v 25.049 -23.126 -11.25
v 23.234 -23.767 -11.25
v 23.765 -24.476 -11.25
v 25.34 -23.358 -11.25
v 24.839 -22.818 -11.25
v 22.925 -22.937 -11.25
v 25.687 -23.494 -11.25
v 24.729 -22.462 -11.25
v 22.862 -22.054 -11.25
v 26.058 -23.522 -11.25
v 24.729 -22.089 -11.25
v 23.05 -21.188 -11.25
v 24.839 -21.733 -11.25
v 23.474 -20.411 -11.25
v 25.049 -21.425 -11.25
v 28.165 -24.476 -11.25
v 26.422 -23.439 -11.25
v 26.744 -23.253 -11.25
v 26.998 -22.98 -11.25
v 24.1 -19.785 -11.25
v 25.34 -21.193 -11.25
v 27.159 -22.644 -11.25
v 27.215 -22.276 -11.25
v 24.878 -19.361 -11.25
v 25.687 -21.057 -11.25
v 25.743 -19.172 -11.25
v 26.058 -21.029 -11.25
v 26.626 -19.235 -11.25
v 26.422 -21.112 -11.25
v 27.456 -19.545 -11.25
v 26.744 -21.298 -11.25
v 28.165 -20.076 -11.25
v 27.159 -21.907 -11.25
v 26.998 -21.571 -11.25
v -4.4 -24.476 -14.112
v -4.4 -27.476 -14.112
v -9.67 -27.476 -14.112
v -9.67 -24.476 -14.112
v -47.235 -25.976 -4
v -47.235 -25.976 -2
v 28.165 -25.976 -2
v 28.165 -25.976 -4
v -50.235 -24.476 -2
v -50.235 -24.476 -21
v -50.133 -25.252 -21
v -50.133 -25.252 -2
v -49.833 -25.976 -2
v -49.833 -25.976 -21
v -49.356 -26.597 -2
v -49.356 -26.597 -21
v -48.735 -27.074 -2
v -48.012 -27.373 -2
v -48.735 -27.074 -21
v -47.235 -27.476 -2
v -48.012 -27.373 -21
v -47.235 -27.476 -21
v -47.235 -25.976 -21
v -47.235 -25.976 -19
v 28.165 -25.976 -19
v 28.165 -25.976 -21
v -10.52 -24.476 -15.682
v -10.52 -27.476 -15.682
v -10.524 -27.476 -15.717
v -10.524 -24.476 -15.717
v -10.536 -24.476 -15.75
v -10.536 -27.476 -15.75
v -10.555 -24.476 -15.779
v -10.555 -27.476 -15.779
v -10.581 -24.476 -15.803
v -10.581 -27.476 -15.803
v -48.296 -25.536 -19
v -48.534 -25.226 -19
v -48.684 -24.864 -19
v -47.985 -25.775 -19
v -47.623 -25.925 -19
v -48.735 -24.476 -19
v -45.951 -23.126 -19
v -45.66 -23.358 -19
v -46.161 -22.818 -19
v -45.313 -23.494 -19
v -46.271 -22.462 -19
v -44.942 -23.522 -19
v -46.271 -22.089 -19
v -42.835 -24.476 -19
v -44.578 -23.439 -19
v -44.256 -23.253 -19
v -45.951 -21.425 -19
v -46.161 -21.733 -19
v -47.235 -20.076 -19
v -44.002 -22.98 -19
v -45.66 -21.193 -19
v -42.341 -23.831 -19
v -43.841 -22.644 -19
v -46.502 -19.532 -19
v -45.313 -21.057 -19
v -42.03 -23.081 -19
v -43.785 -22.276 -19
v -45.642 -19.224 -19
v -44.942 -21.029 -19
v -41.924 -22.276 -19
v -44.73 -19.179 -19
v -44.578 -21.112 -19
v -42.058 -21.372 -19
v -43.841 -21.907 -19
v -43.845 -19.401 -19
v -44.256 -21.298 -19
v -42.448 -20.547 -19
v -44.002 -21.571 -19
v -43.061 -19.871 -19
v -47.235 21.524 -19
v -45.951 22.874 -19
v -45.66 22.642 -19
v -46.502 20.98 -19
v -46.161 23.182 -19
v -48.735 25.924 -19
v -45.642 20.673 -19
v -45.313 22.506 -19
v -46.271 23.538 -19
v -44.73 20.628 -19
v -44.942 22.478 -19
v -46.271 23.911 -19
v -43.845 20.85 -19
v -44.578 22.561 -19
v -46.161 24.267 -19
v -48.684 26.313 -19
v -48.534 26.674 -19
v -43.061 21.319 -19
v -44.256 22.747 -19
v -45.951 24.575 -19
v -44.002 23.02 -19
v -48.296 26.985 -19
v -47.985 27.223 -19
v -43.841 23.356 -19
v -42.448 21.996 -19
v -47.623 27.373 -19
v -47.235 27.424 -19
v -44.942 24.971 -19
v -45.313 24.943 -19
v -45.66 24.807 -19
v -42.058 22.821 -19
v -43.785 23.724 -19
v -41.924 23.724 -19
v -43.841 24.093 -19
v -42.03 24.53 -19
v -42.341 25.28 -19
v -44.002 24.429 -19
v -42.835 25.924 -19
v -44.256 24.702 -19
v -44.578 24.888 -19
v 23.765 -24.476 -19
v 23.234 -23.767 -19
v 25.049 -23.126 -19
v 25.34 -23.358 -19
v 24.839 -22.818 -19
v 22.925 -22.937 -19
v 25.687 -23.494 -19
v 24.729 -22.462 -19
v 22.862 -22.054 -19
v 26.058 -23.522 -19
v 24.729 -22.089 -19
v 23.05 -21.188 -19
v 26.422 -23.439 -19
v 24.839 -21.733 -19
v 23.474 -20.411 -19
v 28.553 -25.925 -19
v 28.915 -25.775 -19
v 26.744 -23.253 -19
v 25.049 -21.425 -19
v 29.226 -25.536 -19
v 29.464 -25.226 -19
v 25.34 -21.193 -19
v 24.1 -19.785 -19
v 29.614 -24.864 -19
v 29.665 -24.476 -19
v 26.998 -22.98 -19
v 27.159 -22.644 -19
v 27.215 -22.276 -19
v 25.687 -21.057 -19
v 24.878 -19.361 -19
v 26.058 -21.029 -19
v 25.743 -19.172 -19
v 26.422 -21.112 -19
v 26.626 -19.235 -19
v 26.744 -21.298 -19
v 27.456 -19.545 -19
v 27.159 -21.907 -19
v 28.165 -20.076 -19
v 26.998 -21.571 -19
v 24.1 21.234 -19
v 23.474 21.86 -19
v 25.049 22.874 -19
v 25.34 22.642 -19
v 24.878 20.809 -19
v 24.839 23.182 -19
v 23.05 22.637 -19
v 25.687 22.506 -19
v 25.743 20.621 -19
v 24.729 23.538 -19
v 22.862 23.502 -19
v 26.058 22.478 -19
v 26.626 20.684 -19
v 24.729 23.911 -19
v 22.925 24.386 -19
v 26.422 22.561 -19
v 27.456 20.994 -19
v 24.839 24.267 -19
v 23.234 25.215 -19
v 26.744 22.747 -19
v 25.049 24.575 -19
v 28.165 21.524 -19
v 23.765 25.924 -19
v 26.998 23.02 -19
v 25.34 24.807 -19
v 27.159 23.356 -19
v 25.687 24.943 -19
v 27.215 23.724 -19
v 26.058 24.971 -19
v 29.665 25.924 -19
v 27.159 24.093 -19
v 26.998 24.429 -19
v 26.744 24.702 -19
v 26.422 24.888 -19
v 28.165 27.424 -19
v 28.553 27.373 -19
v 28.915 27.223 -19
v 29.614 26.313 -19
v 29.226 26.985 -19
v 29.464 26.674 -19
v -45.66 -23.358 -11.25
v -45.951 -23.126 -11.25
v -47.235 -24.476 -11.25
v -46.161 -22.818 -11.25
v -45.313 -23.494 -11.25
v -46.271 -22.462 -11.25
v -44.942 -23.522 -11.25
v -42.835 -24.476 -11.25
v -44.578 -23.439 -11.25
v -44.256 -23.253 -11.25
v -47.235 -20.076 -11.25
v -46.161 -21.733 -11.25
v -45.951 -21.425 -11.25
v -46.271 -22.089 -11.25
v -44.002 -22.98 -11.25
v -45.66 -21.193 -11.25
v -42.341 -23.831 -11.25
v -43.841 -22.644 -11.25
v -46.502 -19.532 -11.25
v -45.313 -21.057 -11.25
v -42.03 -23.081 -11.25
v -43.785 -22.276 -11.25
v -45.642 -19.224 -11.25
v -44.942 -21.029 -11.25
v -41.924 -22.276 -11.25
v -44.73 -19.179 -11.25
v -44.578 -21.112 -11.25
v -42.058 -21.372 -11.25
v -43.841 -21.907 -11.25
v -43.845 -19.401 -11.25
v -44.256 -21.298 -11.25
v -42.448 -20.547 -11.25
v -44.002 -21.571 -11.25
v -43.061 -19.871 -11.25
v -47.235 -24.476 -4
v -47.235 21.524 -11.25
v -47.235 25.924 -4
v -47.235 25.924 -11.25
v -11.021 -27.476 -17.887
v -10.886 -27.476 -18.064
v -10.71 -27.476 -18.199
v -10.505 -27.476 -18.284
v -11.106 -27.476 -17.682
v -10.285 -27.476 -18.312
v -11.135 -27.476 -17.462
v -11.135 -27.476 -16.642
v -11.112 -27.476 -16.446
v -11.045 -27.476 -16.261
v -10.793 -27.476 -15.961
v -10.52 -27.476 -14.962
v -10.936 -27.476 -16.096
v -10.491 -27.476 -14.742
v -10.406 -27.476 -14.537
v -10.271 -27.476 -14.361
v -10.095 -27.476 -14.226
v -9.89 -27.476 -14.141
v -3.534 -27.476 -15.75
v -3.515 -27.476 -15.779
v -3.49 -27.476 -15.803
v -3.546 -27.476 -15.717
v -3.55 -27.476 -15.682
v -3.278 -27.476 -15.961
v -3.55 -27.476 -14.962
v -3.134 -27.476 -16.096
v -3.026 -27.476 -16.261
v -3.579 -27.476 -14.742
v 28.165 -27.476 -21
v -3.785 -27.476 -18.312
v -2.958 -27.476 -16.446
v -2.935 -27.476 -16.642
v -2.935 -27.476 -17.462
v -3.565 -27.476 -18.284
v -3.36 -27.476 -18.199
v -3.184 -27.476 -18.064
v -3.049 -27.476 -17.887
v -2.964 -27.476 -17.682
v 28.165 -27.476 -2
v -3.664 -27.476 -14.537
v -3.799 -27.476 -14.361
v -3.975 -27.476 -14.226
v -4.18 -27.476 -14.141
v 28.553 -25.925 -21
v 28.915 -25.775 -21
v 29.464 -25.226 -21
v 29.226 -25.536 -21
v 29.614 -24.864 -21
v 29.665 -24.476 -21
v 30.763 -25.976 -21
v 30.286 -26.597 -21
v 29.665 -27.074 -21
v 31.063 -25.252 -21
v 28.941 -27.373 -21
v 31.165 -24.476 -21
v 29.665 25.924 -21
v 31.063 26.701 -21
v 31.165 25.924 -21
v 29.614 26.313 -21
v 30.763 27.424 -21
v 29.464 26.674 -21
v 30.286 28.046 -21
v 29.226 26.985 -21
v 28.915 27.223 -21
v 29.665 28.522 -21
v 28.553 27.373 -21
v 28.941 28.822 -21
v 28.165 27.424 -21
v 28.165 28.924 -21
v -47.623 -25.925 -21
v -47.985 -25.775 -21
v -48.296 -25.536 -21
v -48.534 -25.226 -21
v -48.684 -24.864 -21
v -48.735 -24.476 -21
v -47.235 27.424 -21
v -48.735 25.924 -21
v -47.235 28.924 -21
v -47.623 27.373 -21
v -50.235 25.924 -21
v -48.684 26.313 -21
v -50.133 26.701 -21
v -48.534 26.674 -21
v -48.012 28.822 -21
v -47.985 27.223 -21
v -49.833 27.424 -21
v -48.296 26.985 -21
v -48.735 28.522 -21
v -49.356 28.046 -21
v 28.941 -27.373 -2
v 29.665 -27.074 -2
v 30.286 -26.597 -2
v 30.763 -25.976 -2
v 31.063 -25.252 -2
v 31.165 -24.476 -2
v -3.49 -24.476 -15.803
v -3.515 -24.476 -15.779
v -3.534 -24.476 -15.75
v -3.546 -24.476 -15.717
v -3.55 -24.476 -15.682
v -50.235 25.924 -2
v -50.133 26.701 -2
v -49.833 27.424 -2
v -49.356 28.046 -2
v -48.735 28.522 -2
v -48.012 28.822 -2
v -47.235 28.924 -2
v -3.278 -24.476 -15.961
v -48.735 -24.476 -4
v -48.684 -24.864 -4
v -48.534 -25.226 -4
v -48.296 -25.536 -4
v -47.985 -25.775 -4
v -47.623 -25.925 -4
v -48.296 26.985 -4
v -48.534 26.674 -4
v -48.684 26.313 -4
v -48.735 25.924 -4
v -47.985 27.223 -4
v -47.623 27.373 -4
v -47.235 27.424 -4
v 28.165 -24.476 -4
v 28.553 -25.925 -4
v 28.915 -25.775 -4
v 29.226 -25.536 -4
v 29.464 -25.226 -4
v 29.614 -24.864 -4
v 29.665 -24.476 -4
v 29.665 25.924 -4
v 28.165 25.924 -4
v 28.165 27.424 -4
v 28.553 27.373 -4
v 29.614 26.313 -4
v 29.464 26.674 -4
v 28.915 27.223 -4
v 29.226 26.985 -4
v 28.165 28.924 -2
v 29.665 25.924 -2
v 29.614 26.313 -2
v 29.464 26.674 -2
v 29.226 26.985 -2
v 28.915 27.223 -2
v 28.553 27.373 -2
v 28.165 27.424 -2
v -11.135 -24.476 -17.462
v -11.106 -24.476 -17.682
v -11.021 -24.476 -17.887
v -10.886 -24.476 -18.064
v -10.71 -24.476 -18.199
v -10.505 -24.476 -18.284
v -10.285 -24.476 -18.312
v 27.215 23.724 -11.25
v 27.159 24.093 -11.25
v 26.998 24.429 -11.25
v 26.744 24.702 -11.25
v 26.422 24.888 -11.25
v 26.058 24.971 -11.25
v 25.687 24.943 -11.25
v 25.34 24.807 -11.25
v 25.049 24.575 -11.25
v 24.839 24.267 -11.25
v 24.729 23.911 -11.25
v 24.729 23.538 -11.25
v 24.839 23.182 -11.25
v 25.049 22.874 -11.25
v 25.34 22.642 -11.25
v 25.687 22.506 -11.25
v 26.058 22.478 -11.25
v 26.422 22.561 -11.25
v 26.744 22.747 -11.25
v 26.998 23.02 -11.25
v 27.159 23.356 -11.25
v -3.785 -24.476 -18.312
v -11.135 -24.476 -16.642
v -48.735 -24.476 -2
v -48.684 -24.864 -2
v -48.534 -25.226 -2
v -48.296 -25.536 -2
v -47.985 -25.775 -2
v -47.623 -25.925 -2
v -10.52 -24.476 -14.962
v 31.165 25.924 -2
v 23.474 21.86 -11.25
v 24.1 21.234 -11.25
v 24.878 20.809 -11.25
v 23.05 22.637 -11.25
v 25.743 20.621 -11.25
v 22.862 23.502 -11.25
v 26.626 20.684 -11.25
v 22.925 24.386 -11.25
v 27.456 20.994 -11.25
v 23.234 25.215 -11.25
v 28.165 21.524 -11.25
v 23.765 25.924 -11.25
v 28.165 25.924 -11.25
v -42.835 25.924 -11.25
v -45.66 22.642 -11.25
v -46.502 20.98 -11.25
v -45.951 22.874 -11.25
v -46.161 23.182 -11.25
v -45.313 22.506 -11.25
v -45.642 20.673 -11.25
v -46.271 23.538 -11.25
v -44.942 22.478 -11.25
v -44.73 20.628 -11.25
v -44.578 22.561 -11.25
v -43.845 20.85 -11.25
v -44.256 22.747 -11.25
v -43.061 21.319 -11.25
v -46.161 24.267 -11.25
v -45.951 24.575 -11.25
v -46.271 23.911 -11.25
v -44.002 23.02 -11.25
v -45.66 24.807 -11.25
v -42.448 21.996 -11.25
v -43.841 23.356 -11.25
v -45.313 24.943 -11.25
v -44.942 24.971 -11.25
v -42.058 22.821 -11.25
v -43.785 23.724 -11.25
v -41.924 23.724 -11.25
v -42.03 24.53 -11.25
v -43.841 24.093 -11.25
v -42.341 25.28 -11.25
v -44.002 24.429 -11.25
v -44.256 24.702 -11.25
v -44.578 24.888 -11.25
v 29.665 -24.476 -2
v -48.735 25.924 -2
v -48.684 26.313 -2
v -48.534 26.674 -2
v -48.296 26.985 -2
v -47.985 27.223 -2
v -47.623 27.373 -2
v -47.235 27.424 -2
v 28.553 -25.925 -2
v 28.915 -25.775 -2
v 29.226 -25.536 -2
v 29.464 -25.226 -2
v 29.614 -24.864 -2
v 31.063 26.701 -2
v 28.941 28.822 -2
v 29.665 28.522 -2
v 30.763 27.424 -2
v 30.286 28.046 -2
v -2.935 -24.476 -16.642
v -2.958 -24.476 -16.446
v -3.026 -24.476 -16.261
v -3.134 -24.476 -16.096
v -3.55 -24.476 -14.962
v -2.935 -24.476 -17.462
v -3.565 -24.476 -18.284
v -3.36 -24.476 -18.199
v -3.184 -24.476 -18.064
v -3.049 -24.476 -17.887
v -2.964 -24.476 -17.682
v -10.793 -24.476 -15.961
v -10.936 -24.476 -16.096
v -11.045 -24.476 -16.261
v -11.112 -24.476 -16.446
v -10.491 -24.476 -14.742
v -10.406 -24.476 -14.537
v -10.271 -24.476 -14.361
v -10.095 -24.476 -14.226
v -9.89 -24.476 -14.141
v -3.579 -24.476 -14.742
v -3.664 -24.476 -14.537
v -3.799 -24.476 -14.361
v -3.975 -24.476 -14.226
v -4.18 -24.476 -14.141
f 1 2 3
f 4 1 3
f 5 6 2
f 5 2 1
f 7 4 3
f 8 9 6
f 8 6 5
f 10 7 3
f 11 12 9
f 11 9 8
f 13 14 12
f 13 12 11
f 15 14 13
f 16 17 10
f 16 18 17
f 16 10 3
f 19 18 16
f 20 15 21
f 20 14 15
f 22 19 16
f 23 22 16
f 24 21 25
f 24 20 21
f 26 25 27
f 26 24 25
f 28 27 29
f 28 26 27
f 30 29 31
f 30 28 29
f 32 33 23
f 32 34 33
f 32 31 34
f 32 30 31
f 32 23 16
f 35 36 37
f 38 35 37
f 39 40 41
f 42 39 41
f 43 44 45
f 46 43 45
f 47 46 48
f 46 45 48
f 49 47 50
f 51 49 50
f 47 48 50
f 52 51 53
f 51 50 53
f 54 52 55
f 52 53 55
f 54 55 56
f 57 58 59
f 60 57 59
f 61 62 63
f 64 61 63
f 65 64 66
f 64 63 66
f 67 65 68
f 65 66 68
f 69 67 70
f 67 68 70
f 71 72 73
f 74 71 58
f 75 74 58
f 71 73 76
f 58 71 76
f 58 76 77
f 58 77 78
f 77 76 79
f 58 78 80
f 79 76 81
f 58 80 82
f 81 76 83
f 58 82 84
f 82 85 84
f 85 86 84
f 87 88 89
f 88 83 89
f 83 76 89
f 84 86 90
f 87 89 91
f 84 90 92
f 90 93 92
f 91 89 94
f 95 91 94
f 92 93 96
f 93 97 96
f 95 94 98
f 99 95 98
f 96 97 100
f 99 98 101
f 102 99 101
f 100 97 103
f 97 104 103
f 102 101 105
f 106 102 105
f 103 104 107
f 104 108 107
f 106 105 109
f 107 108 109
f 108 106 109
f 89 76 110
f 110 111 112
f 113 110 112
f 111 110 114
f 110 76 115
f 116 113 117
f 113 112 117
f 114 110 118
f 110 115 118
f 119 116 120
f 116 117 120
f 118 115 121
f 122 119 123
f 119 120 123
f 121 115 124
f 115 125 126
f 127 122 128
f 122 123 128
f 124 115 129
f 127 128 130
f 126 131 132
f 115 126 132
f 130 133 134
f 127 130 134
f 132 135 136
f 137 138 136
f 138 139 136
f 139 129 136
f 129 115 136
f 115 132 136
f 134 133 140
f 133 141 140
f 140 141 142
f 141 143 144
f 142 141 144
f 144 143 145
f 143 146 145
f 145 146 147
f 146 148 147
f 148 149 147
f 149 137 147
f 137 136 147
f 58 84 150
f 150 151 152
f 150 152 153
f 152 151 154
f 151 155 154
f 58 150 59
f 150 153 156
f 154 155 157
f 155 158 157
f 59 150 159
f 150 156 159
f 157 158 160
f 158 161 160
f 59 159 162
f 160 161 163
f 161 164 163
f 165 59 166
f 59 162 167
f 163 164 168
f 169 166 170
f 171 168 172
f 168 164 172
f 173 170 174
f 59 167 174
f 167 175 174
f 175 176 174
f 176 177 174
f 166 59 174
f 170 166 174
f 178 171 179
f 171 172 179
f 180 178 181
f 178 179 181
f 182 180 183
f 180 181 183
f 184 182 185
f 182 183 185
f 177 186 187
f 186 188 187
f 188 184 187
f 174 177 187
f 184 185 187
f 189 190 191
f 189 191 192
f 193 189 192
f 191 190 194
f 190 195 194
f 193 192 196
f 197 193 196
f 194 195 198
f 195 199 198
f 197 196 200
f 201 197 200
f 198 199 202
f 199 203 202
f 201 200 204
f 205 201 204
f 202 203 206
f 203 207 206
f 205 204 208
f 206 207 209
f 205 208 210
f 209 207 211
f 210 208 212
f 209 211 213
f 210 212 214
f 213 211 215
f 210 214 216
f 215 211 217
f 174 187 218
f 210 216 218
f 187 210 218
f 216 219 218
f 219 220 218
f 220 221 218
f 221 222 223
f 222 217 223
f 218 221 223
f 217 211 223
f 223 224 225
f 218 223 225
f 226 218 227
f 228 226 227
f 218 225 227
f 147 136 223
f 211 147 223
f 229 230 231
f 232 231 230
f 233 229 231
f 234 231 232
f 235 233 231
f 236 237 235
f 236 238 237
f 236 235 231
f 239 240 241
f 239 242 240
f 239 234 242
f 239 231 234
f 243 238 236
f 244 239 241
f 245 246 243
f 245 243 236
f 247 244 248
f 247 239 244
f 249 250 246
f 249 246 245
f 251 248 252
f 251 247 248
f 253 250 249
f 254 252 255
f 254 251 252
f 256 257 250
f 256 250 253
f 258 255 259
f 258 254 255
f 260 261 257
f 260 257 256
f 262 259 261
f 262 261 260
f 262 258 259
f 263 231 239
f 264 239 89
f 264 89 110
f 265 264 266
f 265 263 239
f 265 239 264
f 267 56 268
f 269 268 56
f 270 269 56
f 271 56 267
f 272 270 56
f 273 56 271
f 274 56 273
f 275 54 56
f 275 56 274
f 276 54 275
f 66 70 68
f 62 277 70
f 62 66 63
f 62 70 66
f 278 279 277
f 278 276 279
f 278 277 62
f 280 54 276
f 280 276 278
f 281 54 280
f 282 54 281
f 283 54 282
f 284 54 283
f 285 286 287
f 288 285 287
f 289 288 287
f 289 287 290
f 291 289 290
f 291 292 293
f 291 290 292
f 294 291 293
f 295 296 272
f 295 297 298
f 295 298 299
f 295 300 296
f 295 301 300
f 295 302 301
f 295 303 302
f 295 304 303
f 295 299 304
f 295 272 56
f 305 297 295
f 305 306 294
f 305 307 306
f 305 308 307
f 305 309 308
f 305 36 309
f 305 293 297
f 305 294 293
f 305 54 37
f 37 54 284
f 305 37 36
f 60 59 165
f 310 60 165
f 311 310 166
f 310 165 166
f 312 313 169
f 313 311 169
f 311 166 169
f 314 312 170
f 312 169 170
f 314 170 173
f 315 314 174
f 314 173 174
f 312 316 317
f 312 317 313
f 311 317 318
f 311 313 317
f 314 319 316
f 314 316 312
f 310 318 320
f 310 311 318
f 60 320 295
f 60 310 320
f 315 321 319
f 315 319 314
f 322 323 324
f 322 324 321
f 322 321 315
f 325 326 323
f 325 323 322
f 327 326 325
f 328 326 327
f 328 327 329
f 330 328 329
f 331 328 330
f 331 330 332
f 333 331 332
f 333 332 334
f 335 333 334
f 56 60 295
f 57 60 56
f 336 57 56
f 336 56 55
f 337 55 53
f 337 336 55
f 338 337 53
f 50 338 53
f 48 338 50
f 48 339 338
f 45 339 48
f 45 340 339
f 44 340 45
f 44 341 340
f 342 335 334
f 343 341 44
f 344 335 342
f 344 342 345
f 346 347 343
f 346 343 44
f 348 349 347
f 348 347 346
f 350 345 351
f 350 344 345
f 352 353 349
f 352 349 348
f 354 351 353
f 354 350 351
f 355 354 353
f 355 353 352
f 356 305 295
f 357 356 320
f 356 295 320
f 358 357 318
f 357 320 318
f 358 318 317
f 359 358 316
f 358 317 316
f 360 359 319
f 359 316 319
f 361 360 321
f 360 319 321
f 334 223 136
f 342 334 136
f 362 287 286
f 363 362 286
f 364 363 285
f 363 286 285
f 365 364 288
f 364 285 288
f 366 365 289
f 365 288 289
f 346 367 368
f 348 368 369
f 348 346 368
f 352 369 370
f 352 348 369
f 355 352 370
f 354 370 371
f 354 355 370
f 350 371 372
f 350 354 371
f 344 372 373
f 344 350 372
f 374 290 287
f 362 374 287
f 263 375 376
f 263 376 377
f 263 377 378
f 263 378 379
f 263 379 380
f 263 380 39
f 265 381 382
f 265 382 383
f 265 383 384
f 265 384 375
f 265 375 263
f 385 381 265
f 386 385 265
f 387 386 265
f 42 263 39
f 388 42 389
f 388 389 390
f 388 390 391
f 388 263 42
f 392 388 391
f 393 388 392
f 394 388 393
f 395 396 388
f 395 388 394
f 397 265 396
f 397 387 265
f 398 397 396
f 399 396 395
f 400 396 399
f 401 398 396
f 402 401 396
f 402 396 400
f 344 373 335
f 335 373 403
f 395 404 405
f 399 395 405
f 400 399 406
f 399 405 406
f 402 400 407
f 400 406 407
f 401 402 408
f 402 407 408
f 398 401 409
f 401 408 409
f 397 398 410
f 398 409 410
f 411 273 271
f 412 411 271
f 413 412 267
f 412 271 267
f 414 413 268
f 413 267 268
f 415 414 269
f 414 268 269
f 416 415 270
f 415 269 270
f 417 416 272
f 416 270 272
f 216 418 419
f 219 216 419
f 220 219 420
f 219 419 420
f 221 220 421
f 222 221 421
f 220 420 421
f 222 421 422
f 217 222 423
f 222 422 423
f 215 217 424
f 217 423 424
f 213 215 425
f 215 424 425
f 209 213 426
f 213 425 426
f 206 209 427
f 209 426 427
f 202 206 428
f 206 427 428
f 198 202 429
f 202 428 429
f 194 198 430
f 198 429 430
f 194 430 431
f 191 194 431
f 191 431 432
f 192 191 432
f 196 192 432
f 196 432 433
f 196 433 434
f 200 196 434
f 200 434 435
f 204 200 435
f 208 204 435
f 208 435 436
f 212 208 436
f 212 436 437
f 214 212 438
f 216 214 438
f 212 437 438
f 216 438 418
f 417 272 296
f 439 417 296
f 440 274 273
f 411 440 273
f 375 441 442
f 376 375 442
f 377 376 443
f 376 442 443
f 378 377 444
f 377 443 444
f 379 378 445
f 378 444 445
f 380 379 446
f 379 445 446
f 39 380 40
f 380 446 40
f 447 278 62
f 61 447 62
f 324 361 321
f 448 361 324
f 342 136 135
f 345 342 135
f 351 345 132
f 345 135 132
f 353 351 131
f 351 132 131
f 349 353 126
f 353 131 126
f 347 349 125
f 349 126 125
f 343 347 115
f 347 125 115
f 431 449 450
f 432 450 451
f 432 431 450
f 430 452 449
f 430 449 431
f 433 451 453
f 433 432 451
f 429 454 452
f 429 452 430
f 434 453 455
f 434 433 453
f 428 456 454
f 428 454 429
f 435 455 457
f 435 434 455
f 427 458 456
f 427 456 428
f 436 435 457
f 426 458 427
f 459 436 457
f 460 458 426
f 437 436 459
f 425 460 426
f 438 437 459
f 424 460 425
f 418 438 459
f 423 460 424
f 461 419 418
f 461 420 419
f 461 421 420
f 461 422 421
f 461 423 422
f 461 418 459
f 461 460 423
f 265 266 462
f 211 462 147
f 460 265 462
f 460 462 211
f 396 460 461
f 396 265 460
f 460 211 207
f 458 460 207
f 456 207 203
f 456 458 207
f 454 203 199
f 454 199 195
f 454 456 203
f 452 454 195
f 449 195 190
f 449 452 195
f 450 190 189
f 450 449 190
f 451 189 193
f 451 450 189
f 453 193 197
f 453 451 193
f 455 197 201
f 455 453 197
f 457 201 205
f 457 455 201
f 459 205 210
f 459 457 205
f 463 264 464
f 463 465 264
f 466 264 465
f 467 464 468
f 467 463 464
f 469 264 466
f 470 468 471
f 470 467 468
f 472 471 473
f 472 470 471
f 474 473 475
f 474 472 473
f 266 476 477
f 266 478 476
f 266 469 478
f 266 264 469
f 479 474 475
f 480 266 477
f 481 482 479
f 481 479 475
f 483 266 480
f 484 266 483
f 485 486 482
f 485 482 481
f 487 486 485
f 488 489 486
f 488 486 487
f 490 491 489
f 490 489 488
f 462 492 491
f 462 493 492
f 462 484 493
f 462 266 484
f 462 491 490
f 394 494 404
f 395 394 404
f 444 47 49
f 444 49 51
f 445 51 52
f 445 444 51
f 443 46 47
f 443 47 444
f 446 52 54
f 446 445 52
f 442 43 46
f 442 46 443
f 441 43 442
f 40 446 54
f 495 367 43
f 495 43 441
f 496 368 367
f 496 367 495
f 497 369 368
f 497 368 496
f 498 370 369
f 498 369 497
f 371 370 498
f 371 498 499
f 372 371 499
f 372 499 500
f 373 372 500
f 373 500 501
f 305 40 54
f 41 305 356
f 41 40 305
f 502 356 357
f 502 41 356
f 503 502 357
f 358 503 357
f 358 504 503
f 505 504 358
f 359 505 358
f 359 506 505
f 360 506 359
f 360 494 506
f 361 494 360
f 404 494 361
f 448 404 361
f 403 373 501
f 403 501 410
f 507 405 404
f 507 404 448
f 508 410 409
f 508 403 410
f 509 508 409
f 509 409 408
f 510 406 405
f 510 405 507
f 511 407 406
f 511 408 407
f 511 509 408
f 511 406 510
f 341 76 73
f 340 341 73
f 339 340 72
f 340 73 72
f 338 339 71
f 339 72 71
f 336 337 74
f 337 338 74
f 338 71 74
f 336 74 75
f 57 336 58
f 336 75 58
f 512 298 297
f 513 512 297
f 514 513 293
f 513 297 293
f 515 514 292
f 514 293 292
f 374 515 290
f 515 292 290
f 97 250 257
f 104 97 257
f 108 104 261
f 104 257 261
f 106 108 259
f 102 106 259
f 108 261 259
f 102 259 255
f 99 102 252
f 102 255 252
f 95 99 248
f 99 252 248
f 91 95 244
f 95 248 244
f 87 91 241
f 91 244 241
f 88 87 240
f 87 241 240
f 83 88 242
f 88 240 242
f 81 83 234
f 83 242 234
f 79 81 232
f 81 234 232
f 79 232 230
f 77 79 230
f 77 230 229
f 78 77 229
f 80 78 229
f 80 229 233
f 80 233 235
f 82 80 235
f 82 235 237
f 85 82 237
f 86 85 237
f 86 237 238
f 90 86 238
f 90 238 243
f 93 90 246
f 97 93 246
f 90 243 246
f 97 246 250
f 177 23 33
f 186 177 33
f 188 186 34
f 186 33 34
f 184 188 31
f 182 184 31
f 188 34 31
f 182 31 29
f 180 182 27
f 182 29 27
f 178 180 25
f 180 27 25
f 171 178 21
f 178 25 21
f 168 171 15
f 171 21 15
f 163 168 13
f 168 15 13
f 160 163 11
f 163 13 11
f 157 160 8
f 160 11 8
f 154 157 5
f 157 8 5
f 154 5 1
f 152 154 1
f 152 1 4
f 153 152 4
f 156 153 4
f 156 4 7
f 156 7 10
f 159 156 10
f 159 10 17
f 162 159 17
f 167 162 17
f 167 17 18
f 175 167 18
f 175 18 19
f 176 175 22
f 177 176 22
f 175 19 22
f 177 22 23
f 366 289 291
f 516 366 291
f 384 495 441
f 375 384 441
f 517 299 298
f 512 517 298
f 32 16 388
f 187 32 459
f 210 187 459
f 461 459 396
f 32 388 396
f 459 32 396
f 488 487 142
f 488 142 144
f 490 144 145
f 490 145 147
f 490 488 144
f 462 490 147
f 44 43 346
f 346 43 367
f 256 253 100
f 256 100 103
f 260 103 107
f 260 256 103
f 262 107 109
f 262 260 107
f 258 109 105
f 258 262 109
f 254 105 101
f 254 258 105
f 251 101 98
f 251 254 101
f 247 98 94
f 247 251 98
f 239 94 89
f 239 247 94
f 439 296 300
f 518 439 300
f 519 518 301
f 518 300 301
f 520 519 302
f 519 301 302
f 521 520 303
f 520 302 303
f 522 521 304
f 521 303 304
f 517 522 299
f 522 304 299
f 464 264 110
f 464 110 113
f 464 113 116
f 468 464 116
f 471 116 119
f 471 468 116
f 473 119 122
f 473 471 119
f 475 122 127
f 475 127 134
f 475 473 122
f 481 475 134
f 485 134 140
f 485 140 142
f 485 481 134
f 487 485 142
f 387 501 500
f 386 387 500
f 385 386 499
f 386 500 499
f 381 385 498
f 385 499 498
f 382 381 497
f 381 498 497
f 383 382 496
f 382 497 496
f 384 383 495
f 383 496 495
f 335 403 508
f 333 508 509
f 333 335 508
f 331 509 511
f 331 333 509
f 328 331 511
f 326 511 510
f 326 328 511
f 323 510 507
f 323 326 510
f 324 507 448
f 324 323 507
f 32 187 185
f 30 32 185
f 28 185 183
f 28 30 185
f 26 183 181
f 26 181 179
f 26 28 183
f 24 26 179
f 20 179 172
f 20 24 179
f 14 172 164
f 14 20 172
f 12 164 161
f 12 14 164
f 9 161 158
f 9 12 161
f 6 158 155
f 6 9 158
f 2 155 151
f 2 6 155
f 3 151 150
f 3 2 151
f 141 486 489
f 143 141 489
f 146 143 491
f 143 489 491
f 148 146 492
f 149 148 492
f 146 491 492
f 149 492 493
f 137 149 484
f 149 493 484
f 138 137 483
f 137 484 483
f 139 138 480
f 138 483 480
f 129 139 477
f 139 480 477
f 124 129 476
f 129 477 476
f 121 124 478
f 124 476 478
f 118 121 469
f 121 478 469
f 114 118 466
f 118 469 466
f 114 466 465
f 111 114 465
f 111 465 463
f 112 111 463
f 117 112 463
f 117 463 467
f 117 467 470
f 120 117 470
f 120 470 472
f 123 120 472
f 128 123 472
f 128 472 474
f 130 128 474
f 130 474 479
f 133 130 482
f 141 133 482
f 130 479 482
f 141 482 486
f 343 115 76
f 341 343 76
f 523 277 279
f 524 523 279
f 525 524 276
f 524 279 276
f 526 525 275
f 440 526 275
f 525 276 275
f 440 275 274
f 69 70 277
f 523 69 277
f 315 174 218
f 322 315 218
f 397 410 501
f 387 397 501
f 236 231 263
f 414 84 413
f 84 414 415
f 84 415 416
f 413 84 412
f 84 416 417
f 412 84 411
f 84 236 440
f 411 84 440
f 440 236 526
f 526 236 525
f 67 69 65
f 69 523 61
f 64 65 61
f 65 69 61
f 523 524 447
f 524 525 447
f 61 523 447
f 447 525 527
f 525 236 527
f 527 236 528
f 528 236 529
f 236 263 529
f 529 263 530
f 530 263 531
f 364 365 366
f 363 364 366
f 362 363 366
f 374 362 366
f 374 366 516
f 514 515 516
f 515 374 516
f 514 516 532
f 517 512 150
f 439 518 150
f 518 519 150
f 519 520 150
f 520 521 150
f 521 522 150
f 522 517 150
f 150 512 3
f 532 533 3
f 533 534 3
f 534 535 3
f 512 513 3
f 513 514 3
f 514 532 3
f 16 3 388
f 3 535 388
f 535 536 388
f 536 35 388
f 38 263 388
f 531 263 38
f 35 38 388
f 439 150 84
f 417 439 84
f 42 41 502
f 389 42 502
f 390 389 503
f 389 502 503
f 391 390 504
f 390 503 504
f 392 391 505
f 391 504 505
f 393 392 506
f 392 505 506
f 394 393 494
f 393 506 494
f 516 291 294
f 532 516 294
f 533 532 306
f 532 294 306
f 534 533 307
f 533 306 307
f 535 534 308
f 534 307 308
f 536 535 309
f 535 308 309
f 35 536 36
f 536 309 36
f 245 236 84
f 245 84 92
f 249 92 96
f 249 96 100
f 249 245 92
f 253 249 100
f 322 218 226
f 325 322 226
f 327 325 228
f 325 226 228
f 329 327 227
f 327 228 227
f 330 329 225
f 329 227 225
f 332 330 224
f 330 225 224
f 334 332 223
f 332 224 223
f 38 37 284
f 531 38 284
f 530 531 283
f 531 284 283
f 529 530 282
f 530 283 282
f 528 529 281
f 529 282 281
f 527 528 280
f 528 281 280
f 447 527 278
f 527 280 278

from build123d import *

# Parameters (mm, degrees)
BOSS_EXTRUDE1_START = -2
SKETCH1_W           = 81.4
SKETCH1_H           = 56.4
SKETCH1_W_2         = 75.4
SKETCH1_H_2         = 50.4
BOSS_EXTRUDE1_DEPTH = 27
FILLET1_R           = 3
SKETCH2_R           = 1.3
CUT_EXTRUDE1_DEPTH  = 2
CUT_EXTRUDE2_START  = -17
SKETCH2_3_R         = 1.3
CUT_EXTRUDE2_DEPTH  = 10
BOSS_EXTRUDE2_START = -7.25
SKETCH3_R           = 1.25
BOSS_EXTRUDE2_DEPTH = 7.75
CUT_EXTRUDE3_DEPTH  = 28.2
CUT_EXTRUDE4_START  = -8
CUT_EXTRUDE4_DEPTH  = 8


with BuildPart() as part:
    # Sketch1 → Boss-Extrude1 (new body)
    with BuildSketch(Plane.XY.offset(BOSS_EXTRUDE1_START)):
        with Locations((-9.535141298, 0.724362859)):
            Rectangle(SKETCH1_W, SKETCH1_H)
        with Locations((-9.535141298, 0.724362859)):
            Rectangle(SKETCH1_W_2, SKETCH1_H_2, mode=Mode.SUBTRACT)
    extrude(amount=-BOSS_EXTRUDE1_DEPTH)

    # Fillet1
    fillet1_edges = [part.edges().sort_by_distance(p)[0] for p in [
        (-50.235141298, -27.475637141, -15.5),
        (-50.235141298, 28.924362859, -15.5),
        (31.164858702, 28.924362859, -15.5),
        (31.164858702, -27.475637141, -15.5),
    ]]
    fillet(fillet1_edges, radius=FILLET1_R)

    # Sketch2 → Cut-Extrude1 (cut)
    with BuildSketch(Plane.XY.offset(-2)):
        with Locations((25.964858702, -22.275637141)):
            Circle(SKETCH2_R)
        with BuildLine():
            Line((28.164858702, 27.424362859), (-47.235141298, 27.424362859))
            ThreePointArc((-47.235141298, 27.424362859), (-48.29580147, 26.985023031), (-48.735141298, 25.924362859))
            Line((-48.735141298, 25.924362859), (-48.735141298, -24.475637141))
            ThreePointArc((-48.735141298, -24.475637141), (-48.29580147, -25.536297313), (-47.235141298, -25.975637141))
            Line((-47.235141298, -25.975637141), (28.164858702, -25.975637141))
            ThreePointArc((28.164858702, -25.975637141), (29.225518873, -25.536297313), (29.664858702, -24.475637141))
            Line((29.664858702, -24.475637141), (29.664858702, 25.924362859))
            ThreePointArc((29.664858702, 25.924362859), (29.225518873, 26.985023031), (28.164858702, 27.424362859))
        make_face()
    extrude(amount=-CUT_EXTRUDE1_DEPTH, mode=Mode.SUBTRACT)

    # Sketch2<3> → Cut-Extrude2 (cut)
    with BuildSketch(Plane.XY.offset(-2).offset(CUT_EXTRUDE2_START)):
        with BuildLine():
            Line((28.164858702, 27.424362859), (-47.235141298, 27.424362859))
            ThreePointArc((-47.235141298, 27.424362859), (-48.29580147, 26.985023031), (-48.735141298, 25.924362859))
            Line((-48.735141298, 25.924362859), (-48.735141298, -24.475637141))
            ThreePointArc((-48.735141298, -24.475637141), (-48.29580147, -25.536297313), (-47.235141298, -25.975637141))
            Line((-47.235141298, -25.975637141), (28.164858702, -25.975637141))
            ThreePointArc((28.164858702, -25.975637141), (29.225518873, -25.536297313), (29.664858702, -24.475637141))
            Line((29.664858702, -24.475637141), (29.664858702, 25.924362859))
            ThreePointArc((29.664858702, 25.924362859), (29.225518873, 26.985023031), (28.164858702, 27.424362859))
        make_face()
        with Locations((25.964858702, 23.724362859)):
            Circle(SKETCH2_3_R, mode=Mode.SUBTRACT)
        with Locations((-45.035141298, 23.724362859)):
            Circle(SKETCH2_3_R, mode=Mode.SUBTRACT)
        with Locations((-45.035141298, -22.275637141)):
            Circle(SKETCH2_3_R, mode=Mode.SUBTRACT)
        with Locations((25.964858702, -22.275637141)):
            Circle(SKETCH2_3_R, mode=Mode.SUBTRACT)
    extrude(amount=-CUT_EXTRUDE2_DEPTH, mode=Mode.SUBTRACT)

    # Sketch3 → Boss-Extrude2 (add)
    # profile 1 of 4: a face of its own
    with BuildSketch(Plane.XY.offset(-4).offset(BOSS_EXTRUDE2_START)):
        with BuildLine():
            Line((-47.235141298, -24.475637141), (-42.835141298, -24.475637141))
            ThreePointArc((-42.835141298, -24.475637141), (-42.160702776, -23.466268561), (-41.923871461, -22.275637141))
            ThreePointArc((-41.923871461, -22.275637141), (-43.844509878, -19.401198618), (-47.235141298, -20.075637141))
            Line((-47.235141298, -20.075637141), (-47.235141298, -24.475637141))
        make_face()
        with Locations((-45.035141298, -22.275637141)):
            Circle(SKETCH3_R, mode=Mode.SUBTRACT)
    # profile 2 of 4: a face of its own
    with BuildSketch(Plane.XY.offset(-4).offset(BOSS_EXTRUDE2_START)):
        with BuildLine():
            ThreePointArc((-41.923871461, 23.724362859), (-42.160702776, 24.914994279), (-42.835141298, 25.924362859))
            Line((-42.835141298, 25.924362859), (-47.235141298, 25.924362859))
            Line((-47.235141298, 25.924362859), (-47.235141298, 21.524362859))
            ThreePointArc((-47.235141298, 21.524362859), (-43.844509878, 20.849924336), (-41.923871461, 23.724362859))
        make_face()
        with Locations((-45.035141298, 23.724362859)):
            Circle(SKETCH3_R, mode=Mode.SUBTRACT)
    # profile 3 of 4: a face of its own
    with BuildSketch(Plane.XY.offset(-4).offset(BOSS_EXTRUDE2_START)):
        with BuildLine():
            ThreePointArc((23.764858702, 25.924362859), (23.764858702, 21.524362859), (28.164858702, 21.524362859))
            Line((28.164858702, 21.524362859), (28.164858702, 25.924362859))
            Line((28.164858702, 25.924362859), (23.764858702, 25.924362859))
        make_face()
        with Locations((25.964858702, 23.724362859)):
            Circle(SKETCH3_R, mode=Mode.SUBTRACT)
    # profile 4 of 4: a face of its own
    with BuildSketch(Plane.XY.offset(-4).offset(BOSS_EXTRUDE2_START)):
        with BuildLine():
            Line((23.764858702, -24.475637141), (28.164858702, -24.475637141))
            Line((28.164858702, -24.475637141), (28.164858702, -20.075637141))
            ThreePointArc((28.164858702, -20.075637141), (23.764858702, -20.075637141), (23.764858702, -24.475637141))
        make_face()
        with Locations((25.964858702, -22.275637141)):
            Circle(SKETCH3_R, mode=Mode.SUBTRACT)
    extrude(amount=-BOSS_EXTRUDE2_DEPTH)

    # Sketch5 → Cut-Extrude3 (cut)
    with BuildSketch(Plane.XZ.offset(27.475637141)):
        with BuildLine():
            Line((-10.285143265, -18.312481798), (-3.785143265, -18.312481798))
            ThreePointArc((-3.785143265, -18.312481798), (-3.184102501, -18.063522562), (-2.935143265, -17.462481798))
            Line((-2.935143265, -17.462481798), (-2.935143265, -16.642481798))
            ThreePointArc((-2.935143265, -16.642481798), (-3.025595699, -16.260922505), (-3.277702075, -15.960570192))
            Line((-3.277702075, -15.960570192), (-3.489691711, -15.80281914))
            ThreePointArc((-3.489691711, -15.80281914), (-3.534181071, -15.749815791), (-3.550143265, -15.682481798))
            Line((-3.550143265, -15.682481798), (-3.550143265, -14.962481798))
            ThreePointArc((-3.550143265, -14.962481798), (-3.799102501, -14.361441034), (-4.400143265, -14.112481798))
            Line((-4.400143265, -14.112481798), (-9.670143265, -14.112481798))
            ThreePointArc((-9.670143265, -14.112481798), (-10.271184029, -14.361441034), (-10.520143265, -14.962481798))
            Line((-10.520143265, -14.962481798), (-10.520143265, -15.682481798))
            ThreePointArc((-10.520143265, -15.682481798), (-10.53610546, -15.749815791), (-10.58059482, -15.80281914))
            Line((-10.58059482, -15.80281914), (-10.792584456, -15.960570192))
            ThreePointArc((-10.792584456, -15.960570192), (-11.044690832, -16.260922505), (-11.135143265, -16.642481798))
            Line((-11.135143265, -16.642481798), (-11.135143265, -17.462481798))
            ThreePointArc((-11.135143265, -17.462481798), (-10.886184029, -18.063522562), (-10.285143265, -18.312481798))
        make_face()
    extrude(amount=-CUT_EXTRUDE3_DEPTH, mode=Mode.SUBTRACT)

    # Sketch6 → Cut-Extrude4 (cut)
    with BuildSketch(Plane(origin=(0, 0, -29), x_dir=(-1, 0, 0), z_dir=(0, 0, -1)).offset(CUT_EXTRUDE4_START)):
        with BuildLine():
            Line((50.235141298, -24.475637141), (50.235141298, 25.924362859))
            ThreePointArc((50.235141298, 25.924362859), (49.356461642, 28.045683202), (47.235141298, 28.924362859))
            Line((47.235141298, 28.924362859), (-28.164858702, 28.924362859))
            ThreePointArc((-28.164858702, 28.924362859), (-30.286179045, 28.045683202), (-31.164858702, 25.924362859))
            Line((-31.164858702, 25.924362859), (-31.164858702, -24.475637141))
            ThreePointArc((-31.164858702, -24.475637141), (-30.286179045, -26.596957485), (-28.164858702, -27.475637141))
            Line((-28.164858702, -27.475637141), (47.235141298, -27.475637141))
            ThreePointArc((47.235141298, -27.475637141), (49.356461642, -26.596957485), (50.235141298, -24.475637141))
        make_face()
        with BuildLine():
            Line((-29.664858702, 25.924362859), (-29.664858702, -24.475637141))
            ThreePointArc((-29.664858702, -24.475637141), (-29.225518873, -25.536297313), (-28.164858702, -25.975637141))
            Line((-28.164858702, -25.975637141), (47.235141298, -25.975637141))
            ThreePointArc((47.235141298, -25.975637141), (48.29580147, -25.536297313), (48.735141298, -24.475637141))
            Line((48.735141298, -24.475637141), (48.735141298, 25.924362859))
            ThreePointArc((48.735141298, 25.924362859), (48.29580147, 26.985023031), (47.235141298, 27.424362859))
            Line((47.235141298, 27.424362859), (-28.164858702, 27.424362859))
            ThreePointArc((-28.164858702, 27.424362859), (-29.225518873, 26.985023031), (-29.664858702, 25.924362859))
        make_face(mode=Mode.SUBTRACT)
    extrude(amount=CUT_EXTRUDE4_DEPTH, mode=Mode.SUBTRACT)


solid = part.part
